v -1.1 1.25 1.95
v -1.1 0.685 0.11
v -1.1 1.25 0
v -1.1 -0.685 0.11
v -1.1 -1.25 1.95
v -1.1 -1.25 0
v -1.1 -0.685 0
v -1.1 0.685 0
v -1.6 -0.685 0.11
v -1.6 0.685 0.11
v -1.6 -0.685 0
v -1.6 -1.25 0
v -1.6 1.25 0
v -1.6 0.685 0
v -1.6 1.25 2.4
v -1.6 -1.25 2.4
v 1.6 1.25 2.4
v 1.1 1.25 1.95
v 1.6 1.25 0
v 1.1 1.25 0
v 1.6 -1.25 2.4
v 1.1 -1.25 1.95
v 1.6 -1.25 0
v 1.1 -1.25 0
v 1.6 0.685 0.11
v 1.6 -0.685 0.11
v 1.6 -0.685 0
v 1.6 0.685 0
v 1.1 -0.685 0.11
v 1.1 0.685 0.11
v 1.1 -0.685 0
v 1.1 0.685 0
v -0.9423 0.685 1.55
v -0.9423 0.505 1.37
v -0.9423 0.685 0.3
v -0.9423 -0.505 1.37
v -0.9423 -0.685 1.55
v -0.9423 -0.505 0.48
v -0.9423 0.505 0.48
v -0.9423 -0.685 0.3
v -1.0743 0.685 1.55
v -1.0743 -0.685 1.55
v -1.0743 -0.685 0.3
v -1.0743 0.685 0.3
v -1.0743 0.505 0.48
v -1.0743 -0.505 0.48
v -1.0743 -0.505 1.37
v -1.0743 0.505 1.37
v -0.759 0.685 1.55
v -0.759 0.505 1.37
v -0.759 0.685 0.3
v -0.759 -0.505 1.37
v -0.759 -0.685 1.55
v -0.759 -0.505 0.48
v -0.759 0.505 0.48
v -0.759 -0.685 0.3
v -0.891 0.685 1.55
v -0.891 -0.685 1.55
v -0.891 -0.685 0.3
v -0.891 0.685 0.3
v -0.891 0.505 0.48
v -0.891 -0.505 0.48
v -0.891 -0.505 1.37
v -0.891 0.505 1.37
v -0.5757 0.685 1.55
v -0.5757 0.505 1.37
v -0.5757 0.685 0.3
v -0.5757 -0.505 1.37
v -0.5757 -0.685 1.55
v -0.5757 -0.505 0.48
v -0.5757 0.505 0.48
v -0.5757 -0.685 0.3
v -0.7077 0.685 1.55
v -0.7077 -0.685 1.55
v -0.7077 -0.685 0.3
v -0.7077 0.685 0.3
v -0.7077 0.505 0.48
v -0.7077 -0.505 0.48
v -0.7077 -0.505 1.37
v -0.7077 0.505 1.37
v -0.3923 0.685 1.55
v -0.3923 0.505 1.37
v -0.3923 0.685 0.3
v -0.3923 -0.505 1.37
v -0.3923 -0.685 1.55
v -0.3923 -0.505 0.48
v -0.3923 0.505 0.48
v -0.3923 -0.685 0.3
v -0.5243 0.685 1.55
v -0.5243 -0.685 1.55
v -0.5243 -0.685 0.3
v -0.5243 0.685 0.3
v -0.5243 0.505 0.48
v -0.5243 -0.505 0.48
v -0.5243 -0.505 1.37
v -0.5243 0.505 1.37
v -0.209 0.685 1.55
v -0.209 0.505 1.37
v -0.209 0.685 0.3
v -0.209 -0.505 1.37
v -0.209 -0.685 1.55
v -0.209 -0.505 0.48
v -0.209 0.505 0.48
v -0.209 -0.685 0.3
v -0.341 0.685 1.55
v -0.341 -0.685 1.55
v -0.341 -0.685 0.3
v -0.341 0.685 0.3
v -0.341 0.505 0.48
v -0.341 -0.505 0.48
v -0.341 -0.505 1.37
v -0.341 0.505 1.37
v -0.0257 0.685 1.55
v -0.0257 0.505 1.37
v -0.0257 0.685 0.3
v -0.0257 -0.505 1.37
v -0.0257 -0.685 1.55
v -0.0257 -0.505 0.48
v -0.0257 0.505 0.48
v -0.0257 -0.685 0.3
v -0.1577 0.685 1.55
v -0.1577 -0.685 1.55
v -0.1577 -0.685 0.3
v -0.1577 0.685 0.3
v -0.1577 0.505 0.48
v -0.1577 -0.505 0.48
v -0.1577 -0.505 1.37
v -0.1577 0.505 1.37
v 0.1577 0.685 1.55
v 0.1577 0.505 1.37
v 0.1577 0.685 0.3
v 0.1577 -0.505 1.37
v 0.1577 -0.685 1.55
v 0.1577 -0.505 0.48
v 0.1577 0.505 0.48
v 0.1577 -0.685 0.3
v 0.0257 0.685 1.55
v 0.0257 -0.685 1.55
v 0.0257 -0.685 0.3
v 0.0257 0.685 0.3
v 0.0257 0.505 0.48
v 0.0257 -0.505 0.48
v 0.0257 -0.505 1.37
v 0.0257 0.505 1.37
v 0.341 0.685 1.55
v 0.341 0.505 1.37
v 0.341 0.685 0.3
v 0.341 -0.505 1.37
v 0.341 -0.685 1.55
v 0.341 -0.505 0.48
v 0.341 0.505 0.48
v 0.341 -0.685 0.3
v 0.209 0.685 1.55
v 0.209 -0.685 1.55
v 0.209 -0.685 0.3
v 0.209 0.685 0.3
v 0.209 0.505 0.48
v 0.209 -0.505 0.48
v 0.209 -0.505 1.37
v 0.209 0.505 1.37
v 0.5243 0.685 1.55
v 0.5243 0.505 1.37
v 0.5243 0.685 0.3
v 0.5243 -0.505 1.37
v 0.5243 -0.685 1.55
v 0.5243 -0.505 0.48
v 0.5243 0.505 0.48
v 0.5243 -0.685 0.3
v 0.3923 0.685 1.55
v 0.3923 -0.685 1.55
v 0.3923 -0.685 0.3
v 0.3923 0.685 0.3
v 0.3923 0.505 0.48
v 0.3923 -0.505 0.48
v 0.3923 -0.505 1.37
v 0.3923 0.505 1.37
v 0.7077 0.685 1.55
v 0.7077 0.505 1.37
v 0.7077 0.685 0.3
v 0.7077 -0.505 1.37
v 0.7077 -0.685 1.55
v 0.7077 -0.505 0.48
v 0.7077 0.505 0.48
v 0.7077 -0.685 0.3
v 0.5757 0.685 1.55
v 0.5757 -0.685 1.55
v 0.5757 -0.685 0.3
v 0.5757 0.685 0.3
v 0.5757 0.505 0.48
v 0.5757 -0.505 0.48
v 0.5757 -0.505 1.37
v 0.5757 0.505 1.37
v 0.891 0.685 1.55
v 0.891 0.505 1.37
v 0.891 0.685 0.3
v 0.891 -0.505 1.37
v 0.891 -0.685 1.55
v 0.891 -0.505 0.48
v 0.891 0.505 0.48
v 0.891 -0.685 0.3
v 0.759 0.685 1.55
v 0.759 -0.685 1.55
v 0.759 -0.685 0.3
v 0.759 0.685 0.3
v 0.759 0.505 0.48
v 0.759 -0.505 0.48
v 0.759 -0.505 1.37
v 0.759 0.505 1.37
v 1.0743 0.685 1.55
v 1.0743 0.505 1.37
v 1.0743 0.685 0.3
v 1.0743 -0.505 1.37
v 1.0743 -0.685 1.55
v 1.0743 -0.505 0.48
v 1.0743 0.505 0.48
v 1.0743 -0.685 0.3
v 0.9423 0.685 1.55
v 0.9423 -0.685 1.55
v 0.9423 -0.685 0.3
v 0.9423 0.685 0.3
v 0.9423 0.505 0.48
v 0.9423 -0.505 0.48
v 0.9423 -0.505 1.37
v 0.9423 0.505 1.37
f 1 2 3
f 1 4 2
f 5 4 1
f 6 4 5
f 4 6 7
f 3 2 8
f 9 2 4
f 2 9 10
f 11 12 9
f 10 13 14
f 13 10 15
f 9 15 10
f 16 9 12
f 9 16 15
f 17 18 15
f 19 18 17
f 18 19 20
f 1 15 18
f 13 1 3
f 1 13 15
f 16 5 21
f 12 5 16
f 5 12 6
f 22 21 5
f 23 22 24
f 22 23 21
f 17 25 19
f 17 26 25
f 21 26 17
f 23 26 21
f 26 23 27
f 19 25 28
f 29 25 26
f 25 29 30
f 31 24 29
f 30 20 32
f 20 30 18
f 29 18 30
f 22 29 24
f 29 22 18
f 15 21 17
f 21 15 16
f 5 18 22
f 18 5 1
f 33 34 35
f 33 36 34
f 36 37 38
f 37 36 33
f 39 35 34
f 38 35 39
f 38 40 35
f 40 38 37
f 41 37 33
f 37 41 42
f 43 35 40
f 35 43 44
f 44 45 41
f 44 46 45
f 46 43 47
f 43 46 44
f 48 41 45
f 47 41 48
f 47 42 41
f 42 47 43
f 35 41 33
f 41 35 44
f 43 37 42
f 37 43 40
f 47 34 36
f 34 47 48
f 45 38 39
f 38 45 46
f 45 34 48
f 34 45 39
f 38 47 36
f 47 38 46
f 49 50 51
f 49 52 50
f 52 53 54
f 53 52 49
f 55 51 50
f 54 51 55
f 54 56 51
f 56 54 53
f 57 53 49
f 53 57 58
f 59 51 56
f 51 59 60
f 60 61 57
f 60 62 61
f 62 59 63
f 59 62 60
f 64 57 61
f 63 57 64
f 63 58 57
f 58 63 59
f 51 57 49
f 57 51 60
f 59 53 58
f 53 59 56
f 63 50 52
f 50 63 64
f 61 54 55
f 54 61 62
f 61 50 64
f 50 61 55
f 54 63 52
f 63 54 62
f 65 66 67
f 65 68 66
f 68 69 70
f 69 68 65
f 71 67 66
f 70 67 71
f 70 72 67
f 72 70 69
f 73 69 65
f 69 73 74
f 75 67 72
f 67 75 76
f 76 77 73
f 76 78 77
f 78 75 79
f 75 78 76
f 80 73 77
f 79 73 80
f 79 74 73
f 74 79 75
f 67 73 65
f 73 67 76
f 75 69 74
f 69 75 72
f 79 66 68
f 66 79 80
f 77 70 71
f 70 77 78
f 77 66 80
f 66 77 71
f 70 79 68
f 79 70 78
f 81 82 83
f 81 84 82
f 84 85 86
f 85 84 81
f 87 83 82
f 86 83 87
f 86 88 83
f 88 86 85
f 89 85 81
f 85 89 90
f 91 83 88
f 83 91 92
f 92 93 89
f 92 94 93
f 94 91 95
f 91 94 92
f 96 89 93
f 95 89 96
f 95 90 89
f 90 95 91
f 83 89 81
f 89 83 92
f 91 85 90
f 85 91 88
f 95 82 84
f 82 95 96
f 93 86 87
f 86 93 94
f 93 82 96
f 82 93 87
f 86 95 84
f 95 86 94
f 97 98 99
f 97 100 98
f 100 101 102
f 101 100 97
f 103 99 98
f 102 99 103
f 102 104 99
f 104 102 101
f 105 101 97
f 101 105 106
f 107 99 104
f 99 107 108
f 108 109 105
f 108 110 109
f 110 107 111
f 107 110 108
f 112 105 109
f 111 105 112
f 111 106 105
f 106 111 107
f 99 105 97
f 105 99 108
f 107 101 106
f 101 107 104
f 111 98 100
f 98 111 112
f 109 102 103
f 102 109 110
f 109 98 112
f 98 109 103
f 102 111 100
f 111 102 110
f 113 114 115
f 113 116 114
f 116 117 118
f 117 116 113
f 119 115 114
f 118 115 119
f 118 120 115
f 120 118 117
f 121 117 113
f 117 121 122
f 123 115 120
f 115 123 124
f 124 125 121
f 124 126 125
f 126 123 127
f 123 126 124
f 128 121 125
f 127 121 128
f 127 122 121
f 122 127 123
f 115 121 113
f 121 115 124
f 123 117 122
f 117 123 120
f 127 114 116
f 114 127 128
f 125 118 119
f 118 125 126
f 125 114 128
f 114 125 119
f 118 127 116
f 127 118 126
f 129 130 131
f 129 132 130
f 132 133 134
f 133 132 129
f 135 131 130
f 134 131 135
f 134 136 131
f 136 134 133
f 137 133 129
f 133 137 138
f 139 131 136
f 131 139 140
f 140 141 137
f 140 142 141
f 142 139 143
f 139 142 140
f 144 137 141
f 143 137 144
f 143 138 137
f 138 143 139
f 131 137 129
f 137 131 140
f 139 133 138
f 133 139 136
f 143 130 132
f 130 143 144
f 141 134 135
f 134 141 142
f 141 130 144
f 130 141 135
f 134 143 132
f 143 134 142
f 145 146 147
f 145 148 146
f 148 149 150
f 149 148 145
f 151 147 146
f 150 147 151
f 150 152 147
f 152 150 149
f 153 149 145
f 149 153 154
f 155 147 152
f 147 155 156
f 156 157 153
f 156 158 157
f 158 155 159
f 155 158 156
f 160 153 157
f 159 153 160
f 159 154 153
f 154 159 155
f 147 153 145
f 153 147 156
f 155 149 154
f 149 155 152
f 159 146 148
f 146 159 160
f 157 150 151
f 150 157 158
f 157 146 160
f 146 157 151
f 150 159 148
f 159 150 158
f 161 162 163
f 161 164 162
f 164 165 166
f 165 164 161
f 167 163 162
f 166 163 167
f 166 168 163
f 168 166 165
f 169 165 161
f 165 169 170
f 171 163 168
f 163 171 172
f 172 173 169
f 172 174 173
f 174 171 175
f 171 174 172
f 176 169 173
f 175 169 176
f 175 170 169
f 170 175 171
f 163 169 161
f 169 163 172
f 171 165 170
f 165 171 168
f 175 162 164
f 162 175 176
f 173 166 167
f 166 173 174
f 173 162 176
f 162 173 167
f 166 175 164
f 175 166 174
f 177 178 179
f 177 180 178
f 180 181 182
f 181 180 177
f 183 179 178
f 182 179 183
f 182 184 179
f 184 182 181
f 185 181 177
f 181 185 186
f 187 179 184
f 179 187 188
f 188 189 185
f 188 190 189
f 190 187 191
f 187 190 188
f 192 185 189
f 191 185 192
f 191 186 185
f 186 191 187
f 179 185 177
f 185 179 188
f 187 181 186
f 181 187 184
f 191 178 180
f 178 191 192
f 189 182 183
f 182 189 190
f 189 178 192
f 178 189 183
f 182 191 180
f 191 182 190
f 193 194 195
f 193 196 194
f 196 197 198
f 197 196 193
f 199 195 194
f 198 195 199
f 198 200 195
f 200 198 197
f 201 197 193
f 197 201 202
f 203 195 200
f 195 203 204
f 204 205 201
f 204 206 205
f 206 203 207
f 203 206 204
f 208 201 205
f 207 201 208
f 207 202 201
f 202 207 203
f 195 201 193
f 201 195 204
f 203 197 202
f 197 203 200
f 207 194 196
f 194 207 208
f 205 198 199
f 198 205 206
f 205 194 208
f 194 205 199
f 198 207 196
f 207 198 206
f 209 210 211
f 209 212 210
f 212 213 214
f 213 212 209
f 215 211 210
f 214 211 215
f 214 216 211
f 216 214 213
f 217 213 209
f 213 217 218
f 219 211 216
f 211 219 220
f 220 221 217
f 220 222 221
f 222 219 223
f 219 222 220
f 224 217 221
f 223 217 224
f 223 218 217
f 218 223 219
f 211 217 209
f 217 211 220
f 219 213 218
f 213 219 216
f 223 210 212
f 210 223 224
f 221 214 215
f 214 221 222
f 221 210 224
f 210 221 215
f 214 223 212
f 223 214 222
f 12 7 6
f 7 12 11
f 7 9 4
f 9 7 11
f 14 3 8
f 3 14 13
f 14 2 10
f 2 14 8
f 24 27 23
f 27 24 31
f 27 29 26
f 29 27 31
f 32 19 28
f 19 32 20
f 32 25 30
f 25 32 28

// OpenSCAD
/*
TDK ATB322524-0110-T000 generated-envelope model.
Evidence: TDK ATB3225 type datasheet, page 3, ATB322524 shape and
dimensions plus recommended land pattern (2019-02-21).

Coordinate contract: millimetres; footprint origin is the package centre;
+X runs from pins 1/2 toward pins 4/3, +Y runs from pins 2/3 toward pins 1/4,
and Z=0 is the PCB seating plane. Pin 1 is at -X,+Y.

The outer envelope, 0.50 mm end regions, 1.37 mm winding width, and terminal
layout are documented. Winding height, turn count, terminal thickness, core
beam thickness, and pin-mark dimensions are visual assumptions contained
inside the documented envelope; this is not an exact internal construction.
*/

$fa = 5;
$fs = 0.08;
epsilon = 0.01;
render_part = "all";
projection_view = "3d";

body_x = 3.20;
body_y = 2.50;
body_z = 2.40;
end_region_x = 0.50;
winding_y = 1.37;

terminal_x = 0.50;              // documented package end region
terminal_y = (body_y - winding_y) / 2;
terminal_z = 0.12;              // visual assumption
core_beam_z = 0.45;             // visual assumption from drawing proportions
winding_z = 1.25;               // visual assumption within envelope
winding_bottom_z = 0.30;        // visual assumption
winding_turns = 12;             // cosmetic; manufacturer turn count unpublished
winding_fill = 0.72;
mark_radius = 0.16;             // visual orientation mark assumption
mark_depth = 0.025;
mark_x = -0.62;
mark_y = 0.62;

housing_color = [0.10, 0.11, 0.12];
copper_color = [0.72, 0.30, 0.08];
terminal_color = [0.72, 0.74, 0.76];
mark_color = [0.82, 0.84, 0.86];

module housing() {
    difference() {
        union() {
            // Ferrite top beam and two end legs; overlaps make one solid.
            translate([-body_x / 2, -body_y / 2, body_z - core_beam_z])
                cube([body_x, body_y, core_beam_z]);
            for (x = [-body_x / 2, body_x / 2 - end_region_x])
                translate([x, -body_y / 2, terminal_z - epsilon])
                    cube([end_region_x, body_y,
                          body_z - core_beam_z - terminal_z + 2 * epsilon]);
        }
        // Shallow pin-1 mark stays within the documented maximum height.
        translate([mark_x, mark_y, body_z - mark_depth])
            cylinder(r=mark_radius, h=mark_depth + epsilon);
    }
}

module winding_turn(x_center, turn_width) {
    difference() {
        translate([x_center - turn_width / 2,
                   -winding_y / 2,
                   winding_bottom_z])
            cube([turn_width, winding_y, winding_z]);
        translate([x_center - turn_width / 2 - epsilon,
                   -winding_y / 2 + 0.18,
                   winding_bottom_z + 0.18])
            cube([turn_width + 2 * epsilon,
                  winding_y - 0.36,
                  winding_z - 0.36]);
    }
}

module windings() {
    winding_span_x = body_x - 2 * end_region_x;
    pitch = winding_span_x / winding_turns;
    turn_width = pitch * winding_fill;
    for (index = [0 : winding_turns - 1])
        winding_turn(-winding_span_x / 2 + pitch * (index + 0.5), turn_width);
}

module terminals() {
    for (x = [-body_x / 2, body_x / 2 - terminal_x])
        for (y = [-body_y / 2, body_y / 2 - terminal_y])
            translate([x, y, 0]) cube([terminal_x, terminal_y, terminal_z]);
}

module marking() {
    translate([mark_x, mark_y, body_z - mark_depth])
        cylinder(r=mark_radius, h=mark_depth);
}

module selected_model() {
    if (render_part == "housing" || render_part == "all")
        color(housing_color) housing();
    if (render_part == "windings" || render_part == "all")
        color(copper_color) windings();
    if (render_part == "terminals" || render_part == "all")
        color(terminal_color) terminals();
    if (render_part == "marking" || render_part == "all")
        color(mark_color) marking();
}

if (projection_view == "top")
    projection(cut=false) selected_model();
else if (projection_view == "front")
    projection(cut=false) rotate([90, 0, 0]) selected_model();
else if (projection_view == "side")
    projection(cut=false) rotate([90, 0, 90]) selected_model();
else
    selected_model();
